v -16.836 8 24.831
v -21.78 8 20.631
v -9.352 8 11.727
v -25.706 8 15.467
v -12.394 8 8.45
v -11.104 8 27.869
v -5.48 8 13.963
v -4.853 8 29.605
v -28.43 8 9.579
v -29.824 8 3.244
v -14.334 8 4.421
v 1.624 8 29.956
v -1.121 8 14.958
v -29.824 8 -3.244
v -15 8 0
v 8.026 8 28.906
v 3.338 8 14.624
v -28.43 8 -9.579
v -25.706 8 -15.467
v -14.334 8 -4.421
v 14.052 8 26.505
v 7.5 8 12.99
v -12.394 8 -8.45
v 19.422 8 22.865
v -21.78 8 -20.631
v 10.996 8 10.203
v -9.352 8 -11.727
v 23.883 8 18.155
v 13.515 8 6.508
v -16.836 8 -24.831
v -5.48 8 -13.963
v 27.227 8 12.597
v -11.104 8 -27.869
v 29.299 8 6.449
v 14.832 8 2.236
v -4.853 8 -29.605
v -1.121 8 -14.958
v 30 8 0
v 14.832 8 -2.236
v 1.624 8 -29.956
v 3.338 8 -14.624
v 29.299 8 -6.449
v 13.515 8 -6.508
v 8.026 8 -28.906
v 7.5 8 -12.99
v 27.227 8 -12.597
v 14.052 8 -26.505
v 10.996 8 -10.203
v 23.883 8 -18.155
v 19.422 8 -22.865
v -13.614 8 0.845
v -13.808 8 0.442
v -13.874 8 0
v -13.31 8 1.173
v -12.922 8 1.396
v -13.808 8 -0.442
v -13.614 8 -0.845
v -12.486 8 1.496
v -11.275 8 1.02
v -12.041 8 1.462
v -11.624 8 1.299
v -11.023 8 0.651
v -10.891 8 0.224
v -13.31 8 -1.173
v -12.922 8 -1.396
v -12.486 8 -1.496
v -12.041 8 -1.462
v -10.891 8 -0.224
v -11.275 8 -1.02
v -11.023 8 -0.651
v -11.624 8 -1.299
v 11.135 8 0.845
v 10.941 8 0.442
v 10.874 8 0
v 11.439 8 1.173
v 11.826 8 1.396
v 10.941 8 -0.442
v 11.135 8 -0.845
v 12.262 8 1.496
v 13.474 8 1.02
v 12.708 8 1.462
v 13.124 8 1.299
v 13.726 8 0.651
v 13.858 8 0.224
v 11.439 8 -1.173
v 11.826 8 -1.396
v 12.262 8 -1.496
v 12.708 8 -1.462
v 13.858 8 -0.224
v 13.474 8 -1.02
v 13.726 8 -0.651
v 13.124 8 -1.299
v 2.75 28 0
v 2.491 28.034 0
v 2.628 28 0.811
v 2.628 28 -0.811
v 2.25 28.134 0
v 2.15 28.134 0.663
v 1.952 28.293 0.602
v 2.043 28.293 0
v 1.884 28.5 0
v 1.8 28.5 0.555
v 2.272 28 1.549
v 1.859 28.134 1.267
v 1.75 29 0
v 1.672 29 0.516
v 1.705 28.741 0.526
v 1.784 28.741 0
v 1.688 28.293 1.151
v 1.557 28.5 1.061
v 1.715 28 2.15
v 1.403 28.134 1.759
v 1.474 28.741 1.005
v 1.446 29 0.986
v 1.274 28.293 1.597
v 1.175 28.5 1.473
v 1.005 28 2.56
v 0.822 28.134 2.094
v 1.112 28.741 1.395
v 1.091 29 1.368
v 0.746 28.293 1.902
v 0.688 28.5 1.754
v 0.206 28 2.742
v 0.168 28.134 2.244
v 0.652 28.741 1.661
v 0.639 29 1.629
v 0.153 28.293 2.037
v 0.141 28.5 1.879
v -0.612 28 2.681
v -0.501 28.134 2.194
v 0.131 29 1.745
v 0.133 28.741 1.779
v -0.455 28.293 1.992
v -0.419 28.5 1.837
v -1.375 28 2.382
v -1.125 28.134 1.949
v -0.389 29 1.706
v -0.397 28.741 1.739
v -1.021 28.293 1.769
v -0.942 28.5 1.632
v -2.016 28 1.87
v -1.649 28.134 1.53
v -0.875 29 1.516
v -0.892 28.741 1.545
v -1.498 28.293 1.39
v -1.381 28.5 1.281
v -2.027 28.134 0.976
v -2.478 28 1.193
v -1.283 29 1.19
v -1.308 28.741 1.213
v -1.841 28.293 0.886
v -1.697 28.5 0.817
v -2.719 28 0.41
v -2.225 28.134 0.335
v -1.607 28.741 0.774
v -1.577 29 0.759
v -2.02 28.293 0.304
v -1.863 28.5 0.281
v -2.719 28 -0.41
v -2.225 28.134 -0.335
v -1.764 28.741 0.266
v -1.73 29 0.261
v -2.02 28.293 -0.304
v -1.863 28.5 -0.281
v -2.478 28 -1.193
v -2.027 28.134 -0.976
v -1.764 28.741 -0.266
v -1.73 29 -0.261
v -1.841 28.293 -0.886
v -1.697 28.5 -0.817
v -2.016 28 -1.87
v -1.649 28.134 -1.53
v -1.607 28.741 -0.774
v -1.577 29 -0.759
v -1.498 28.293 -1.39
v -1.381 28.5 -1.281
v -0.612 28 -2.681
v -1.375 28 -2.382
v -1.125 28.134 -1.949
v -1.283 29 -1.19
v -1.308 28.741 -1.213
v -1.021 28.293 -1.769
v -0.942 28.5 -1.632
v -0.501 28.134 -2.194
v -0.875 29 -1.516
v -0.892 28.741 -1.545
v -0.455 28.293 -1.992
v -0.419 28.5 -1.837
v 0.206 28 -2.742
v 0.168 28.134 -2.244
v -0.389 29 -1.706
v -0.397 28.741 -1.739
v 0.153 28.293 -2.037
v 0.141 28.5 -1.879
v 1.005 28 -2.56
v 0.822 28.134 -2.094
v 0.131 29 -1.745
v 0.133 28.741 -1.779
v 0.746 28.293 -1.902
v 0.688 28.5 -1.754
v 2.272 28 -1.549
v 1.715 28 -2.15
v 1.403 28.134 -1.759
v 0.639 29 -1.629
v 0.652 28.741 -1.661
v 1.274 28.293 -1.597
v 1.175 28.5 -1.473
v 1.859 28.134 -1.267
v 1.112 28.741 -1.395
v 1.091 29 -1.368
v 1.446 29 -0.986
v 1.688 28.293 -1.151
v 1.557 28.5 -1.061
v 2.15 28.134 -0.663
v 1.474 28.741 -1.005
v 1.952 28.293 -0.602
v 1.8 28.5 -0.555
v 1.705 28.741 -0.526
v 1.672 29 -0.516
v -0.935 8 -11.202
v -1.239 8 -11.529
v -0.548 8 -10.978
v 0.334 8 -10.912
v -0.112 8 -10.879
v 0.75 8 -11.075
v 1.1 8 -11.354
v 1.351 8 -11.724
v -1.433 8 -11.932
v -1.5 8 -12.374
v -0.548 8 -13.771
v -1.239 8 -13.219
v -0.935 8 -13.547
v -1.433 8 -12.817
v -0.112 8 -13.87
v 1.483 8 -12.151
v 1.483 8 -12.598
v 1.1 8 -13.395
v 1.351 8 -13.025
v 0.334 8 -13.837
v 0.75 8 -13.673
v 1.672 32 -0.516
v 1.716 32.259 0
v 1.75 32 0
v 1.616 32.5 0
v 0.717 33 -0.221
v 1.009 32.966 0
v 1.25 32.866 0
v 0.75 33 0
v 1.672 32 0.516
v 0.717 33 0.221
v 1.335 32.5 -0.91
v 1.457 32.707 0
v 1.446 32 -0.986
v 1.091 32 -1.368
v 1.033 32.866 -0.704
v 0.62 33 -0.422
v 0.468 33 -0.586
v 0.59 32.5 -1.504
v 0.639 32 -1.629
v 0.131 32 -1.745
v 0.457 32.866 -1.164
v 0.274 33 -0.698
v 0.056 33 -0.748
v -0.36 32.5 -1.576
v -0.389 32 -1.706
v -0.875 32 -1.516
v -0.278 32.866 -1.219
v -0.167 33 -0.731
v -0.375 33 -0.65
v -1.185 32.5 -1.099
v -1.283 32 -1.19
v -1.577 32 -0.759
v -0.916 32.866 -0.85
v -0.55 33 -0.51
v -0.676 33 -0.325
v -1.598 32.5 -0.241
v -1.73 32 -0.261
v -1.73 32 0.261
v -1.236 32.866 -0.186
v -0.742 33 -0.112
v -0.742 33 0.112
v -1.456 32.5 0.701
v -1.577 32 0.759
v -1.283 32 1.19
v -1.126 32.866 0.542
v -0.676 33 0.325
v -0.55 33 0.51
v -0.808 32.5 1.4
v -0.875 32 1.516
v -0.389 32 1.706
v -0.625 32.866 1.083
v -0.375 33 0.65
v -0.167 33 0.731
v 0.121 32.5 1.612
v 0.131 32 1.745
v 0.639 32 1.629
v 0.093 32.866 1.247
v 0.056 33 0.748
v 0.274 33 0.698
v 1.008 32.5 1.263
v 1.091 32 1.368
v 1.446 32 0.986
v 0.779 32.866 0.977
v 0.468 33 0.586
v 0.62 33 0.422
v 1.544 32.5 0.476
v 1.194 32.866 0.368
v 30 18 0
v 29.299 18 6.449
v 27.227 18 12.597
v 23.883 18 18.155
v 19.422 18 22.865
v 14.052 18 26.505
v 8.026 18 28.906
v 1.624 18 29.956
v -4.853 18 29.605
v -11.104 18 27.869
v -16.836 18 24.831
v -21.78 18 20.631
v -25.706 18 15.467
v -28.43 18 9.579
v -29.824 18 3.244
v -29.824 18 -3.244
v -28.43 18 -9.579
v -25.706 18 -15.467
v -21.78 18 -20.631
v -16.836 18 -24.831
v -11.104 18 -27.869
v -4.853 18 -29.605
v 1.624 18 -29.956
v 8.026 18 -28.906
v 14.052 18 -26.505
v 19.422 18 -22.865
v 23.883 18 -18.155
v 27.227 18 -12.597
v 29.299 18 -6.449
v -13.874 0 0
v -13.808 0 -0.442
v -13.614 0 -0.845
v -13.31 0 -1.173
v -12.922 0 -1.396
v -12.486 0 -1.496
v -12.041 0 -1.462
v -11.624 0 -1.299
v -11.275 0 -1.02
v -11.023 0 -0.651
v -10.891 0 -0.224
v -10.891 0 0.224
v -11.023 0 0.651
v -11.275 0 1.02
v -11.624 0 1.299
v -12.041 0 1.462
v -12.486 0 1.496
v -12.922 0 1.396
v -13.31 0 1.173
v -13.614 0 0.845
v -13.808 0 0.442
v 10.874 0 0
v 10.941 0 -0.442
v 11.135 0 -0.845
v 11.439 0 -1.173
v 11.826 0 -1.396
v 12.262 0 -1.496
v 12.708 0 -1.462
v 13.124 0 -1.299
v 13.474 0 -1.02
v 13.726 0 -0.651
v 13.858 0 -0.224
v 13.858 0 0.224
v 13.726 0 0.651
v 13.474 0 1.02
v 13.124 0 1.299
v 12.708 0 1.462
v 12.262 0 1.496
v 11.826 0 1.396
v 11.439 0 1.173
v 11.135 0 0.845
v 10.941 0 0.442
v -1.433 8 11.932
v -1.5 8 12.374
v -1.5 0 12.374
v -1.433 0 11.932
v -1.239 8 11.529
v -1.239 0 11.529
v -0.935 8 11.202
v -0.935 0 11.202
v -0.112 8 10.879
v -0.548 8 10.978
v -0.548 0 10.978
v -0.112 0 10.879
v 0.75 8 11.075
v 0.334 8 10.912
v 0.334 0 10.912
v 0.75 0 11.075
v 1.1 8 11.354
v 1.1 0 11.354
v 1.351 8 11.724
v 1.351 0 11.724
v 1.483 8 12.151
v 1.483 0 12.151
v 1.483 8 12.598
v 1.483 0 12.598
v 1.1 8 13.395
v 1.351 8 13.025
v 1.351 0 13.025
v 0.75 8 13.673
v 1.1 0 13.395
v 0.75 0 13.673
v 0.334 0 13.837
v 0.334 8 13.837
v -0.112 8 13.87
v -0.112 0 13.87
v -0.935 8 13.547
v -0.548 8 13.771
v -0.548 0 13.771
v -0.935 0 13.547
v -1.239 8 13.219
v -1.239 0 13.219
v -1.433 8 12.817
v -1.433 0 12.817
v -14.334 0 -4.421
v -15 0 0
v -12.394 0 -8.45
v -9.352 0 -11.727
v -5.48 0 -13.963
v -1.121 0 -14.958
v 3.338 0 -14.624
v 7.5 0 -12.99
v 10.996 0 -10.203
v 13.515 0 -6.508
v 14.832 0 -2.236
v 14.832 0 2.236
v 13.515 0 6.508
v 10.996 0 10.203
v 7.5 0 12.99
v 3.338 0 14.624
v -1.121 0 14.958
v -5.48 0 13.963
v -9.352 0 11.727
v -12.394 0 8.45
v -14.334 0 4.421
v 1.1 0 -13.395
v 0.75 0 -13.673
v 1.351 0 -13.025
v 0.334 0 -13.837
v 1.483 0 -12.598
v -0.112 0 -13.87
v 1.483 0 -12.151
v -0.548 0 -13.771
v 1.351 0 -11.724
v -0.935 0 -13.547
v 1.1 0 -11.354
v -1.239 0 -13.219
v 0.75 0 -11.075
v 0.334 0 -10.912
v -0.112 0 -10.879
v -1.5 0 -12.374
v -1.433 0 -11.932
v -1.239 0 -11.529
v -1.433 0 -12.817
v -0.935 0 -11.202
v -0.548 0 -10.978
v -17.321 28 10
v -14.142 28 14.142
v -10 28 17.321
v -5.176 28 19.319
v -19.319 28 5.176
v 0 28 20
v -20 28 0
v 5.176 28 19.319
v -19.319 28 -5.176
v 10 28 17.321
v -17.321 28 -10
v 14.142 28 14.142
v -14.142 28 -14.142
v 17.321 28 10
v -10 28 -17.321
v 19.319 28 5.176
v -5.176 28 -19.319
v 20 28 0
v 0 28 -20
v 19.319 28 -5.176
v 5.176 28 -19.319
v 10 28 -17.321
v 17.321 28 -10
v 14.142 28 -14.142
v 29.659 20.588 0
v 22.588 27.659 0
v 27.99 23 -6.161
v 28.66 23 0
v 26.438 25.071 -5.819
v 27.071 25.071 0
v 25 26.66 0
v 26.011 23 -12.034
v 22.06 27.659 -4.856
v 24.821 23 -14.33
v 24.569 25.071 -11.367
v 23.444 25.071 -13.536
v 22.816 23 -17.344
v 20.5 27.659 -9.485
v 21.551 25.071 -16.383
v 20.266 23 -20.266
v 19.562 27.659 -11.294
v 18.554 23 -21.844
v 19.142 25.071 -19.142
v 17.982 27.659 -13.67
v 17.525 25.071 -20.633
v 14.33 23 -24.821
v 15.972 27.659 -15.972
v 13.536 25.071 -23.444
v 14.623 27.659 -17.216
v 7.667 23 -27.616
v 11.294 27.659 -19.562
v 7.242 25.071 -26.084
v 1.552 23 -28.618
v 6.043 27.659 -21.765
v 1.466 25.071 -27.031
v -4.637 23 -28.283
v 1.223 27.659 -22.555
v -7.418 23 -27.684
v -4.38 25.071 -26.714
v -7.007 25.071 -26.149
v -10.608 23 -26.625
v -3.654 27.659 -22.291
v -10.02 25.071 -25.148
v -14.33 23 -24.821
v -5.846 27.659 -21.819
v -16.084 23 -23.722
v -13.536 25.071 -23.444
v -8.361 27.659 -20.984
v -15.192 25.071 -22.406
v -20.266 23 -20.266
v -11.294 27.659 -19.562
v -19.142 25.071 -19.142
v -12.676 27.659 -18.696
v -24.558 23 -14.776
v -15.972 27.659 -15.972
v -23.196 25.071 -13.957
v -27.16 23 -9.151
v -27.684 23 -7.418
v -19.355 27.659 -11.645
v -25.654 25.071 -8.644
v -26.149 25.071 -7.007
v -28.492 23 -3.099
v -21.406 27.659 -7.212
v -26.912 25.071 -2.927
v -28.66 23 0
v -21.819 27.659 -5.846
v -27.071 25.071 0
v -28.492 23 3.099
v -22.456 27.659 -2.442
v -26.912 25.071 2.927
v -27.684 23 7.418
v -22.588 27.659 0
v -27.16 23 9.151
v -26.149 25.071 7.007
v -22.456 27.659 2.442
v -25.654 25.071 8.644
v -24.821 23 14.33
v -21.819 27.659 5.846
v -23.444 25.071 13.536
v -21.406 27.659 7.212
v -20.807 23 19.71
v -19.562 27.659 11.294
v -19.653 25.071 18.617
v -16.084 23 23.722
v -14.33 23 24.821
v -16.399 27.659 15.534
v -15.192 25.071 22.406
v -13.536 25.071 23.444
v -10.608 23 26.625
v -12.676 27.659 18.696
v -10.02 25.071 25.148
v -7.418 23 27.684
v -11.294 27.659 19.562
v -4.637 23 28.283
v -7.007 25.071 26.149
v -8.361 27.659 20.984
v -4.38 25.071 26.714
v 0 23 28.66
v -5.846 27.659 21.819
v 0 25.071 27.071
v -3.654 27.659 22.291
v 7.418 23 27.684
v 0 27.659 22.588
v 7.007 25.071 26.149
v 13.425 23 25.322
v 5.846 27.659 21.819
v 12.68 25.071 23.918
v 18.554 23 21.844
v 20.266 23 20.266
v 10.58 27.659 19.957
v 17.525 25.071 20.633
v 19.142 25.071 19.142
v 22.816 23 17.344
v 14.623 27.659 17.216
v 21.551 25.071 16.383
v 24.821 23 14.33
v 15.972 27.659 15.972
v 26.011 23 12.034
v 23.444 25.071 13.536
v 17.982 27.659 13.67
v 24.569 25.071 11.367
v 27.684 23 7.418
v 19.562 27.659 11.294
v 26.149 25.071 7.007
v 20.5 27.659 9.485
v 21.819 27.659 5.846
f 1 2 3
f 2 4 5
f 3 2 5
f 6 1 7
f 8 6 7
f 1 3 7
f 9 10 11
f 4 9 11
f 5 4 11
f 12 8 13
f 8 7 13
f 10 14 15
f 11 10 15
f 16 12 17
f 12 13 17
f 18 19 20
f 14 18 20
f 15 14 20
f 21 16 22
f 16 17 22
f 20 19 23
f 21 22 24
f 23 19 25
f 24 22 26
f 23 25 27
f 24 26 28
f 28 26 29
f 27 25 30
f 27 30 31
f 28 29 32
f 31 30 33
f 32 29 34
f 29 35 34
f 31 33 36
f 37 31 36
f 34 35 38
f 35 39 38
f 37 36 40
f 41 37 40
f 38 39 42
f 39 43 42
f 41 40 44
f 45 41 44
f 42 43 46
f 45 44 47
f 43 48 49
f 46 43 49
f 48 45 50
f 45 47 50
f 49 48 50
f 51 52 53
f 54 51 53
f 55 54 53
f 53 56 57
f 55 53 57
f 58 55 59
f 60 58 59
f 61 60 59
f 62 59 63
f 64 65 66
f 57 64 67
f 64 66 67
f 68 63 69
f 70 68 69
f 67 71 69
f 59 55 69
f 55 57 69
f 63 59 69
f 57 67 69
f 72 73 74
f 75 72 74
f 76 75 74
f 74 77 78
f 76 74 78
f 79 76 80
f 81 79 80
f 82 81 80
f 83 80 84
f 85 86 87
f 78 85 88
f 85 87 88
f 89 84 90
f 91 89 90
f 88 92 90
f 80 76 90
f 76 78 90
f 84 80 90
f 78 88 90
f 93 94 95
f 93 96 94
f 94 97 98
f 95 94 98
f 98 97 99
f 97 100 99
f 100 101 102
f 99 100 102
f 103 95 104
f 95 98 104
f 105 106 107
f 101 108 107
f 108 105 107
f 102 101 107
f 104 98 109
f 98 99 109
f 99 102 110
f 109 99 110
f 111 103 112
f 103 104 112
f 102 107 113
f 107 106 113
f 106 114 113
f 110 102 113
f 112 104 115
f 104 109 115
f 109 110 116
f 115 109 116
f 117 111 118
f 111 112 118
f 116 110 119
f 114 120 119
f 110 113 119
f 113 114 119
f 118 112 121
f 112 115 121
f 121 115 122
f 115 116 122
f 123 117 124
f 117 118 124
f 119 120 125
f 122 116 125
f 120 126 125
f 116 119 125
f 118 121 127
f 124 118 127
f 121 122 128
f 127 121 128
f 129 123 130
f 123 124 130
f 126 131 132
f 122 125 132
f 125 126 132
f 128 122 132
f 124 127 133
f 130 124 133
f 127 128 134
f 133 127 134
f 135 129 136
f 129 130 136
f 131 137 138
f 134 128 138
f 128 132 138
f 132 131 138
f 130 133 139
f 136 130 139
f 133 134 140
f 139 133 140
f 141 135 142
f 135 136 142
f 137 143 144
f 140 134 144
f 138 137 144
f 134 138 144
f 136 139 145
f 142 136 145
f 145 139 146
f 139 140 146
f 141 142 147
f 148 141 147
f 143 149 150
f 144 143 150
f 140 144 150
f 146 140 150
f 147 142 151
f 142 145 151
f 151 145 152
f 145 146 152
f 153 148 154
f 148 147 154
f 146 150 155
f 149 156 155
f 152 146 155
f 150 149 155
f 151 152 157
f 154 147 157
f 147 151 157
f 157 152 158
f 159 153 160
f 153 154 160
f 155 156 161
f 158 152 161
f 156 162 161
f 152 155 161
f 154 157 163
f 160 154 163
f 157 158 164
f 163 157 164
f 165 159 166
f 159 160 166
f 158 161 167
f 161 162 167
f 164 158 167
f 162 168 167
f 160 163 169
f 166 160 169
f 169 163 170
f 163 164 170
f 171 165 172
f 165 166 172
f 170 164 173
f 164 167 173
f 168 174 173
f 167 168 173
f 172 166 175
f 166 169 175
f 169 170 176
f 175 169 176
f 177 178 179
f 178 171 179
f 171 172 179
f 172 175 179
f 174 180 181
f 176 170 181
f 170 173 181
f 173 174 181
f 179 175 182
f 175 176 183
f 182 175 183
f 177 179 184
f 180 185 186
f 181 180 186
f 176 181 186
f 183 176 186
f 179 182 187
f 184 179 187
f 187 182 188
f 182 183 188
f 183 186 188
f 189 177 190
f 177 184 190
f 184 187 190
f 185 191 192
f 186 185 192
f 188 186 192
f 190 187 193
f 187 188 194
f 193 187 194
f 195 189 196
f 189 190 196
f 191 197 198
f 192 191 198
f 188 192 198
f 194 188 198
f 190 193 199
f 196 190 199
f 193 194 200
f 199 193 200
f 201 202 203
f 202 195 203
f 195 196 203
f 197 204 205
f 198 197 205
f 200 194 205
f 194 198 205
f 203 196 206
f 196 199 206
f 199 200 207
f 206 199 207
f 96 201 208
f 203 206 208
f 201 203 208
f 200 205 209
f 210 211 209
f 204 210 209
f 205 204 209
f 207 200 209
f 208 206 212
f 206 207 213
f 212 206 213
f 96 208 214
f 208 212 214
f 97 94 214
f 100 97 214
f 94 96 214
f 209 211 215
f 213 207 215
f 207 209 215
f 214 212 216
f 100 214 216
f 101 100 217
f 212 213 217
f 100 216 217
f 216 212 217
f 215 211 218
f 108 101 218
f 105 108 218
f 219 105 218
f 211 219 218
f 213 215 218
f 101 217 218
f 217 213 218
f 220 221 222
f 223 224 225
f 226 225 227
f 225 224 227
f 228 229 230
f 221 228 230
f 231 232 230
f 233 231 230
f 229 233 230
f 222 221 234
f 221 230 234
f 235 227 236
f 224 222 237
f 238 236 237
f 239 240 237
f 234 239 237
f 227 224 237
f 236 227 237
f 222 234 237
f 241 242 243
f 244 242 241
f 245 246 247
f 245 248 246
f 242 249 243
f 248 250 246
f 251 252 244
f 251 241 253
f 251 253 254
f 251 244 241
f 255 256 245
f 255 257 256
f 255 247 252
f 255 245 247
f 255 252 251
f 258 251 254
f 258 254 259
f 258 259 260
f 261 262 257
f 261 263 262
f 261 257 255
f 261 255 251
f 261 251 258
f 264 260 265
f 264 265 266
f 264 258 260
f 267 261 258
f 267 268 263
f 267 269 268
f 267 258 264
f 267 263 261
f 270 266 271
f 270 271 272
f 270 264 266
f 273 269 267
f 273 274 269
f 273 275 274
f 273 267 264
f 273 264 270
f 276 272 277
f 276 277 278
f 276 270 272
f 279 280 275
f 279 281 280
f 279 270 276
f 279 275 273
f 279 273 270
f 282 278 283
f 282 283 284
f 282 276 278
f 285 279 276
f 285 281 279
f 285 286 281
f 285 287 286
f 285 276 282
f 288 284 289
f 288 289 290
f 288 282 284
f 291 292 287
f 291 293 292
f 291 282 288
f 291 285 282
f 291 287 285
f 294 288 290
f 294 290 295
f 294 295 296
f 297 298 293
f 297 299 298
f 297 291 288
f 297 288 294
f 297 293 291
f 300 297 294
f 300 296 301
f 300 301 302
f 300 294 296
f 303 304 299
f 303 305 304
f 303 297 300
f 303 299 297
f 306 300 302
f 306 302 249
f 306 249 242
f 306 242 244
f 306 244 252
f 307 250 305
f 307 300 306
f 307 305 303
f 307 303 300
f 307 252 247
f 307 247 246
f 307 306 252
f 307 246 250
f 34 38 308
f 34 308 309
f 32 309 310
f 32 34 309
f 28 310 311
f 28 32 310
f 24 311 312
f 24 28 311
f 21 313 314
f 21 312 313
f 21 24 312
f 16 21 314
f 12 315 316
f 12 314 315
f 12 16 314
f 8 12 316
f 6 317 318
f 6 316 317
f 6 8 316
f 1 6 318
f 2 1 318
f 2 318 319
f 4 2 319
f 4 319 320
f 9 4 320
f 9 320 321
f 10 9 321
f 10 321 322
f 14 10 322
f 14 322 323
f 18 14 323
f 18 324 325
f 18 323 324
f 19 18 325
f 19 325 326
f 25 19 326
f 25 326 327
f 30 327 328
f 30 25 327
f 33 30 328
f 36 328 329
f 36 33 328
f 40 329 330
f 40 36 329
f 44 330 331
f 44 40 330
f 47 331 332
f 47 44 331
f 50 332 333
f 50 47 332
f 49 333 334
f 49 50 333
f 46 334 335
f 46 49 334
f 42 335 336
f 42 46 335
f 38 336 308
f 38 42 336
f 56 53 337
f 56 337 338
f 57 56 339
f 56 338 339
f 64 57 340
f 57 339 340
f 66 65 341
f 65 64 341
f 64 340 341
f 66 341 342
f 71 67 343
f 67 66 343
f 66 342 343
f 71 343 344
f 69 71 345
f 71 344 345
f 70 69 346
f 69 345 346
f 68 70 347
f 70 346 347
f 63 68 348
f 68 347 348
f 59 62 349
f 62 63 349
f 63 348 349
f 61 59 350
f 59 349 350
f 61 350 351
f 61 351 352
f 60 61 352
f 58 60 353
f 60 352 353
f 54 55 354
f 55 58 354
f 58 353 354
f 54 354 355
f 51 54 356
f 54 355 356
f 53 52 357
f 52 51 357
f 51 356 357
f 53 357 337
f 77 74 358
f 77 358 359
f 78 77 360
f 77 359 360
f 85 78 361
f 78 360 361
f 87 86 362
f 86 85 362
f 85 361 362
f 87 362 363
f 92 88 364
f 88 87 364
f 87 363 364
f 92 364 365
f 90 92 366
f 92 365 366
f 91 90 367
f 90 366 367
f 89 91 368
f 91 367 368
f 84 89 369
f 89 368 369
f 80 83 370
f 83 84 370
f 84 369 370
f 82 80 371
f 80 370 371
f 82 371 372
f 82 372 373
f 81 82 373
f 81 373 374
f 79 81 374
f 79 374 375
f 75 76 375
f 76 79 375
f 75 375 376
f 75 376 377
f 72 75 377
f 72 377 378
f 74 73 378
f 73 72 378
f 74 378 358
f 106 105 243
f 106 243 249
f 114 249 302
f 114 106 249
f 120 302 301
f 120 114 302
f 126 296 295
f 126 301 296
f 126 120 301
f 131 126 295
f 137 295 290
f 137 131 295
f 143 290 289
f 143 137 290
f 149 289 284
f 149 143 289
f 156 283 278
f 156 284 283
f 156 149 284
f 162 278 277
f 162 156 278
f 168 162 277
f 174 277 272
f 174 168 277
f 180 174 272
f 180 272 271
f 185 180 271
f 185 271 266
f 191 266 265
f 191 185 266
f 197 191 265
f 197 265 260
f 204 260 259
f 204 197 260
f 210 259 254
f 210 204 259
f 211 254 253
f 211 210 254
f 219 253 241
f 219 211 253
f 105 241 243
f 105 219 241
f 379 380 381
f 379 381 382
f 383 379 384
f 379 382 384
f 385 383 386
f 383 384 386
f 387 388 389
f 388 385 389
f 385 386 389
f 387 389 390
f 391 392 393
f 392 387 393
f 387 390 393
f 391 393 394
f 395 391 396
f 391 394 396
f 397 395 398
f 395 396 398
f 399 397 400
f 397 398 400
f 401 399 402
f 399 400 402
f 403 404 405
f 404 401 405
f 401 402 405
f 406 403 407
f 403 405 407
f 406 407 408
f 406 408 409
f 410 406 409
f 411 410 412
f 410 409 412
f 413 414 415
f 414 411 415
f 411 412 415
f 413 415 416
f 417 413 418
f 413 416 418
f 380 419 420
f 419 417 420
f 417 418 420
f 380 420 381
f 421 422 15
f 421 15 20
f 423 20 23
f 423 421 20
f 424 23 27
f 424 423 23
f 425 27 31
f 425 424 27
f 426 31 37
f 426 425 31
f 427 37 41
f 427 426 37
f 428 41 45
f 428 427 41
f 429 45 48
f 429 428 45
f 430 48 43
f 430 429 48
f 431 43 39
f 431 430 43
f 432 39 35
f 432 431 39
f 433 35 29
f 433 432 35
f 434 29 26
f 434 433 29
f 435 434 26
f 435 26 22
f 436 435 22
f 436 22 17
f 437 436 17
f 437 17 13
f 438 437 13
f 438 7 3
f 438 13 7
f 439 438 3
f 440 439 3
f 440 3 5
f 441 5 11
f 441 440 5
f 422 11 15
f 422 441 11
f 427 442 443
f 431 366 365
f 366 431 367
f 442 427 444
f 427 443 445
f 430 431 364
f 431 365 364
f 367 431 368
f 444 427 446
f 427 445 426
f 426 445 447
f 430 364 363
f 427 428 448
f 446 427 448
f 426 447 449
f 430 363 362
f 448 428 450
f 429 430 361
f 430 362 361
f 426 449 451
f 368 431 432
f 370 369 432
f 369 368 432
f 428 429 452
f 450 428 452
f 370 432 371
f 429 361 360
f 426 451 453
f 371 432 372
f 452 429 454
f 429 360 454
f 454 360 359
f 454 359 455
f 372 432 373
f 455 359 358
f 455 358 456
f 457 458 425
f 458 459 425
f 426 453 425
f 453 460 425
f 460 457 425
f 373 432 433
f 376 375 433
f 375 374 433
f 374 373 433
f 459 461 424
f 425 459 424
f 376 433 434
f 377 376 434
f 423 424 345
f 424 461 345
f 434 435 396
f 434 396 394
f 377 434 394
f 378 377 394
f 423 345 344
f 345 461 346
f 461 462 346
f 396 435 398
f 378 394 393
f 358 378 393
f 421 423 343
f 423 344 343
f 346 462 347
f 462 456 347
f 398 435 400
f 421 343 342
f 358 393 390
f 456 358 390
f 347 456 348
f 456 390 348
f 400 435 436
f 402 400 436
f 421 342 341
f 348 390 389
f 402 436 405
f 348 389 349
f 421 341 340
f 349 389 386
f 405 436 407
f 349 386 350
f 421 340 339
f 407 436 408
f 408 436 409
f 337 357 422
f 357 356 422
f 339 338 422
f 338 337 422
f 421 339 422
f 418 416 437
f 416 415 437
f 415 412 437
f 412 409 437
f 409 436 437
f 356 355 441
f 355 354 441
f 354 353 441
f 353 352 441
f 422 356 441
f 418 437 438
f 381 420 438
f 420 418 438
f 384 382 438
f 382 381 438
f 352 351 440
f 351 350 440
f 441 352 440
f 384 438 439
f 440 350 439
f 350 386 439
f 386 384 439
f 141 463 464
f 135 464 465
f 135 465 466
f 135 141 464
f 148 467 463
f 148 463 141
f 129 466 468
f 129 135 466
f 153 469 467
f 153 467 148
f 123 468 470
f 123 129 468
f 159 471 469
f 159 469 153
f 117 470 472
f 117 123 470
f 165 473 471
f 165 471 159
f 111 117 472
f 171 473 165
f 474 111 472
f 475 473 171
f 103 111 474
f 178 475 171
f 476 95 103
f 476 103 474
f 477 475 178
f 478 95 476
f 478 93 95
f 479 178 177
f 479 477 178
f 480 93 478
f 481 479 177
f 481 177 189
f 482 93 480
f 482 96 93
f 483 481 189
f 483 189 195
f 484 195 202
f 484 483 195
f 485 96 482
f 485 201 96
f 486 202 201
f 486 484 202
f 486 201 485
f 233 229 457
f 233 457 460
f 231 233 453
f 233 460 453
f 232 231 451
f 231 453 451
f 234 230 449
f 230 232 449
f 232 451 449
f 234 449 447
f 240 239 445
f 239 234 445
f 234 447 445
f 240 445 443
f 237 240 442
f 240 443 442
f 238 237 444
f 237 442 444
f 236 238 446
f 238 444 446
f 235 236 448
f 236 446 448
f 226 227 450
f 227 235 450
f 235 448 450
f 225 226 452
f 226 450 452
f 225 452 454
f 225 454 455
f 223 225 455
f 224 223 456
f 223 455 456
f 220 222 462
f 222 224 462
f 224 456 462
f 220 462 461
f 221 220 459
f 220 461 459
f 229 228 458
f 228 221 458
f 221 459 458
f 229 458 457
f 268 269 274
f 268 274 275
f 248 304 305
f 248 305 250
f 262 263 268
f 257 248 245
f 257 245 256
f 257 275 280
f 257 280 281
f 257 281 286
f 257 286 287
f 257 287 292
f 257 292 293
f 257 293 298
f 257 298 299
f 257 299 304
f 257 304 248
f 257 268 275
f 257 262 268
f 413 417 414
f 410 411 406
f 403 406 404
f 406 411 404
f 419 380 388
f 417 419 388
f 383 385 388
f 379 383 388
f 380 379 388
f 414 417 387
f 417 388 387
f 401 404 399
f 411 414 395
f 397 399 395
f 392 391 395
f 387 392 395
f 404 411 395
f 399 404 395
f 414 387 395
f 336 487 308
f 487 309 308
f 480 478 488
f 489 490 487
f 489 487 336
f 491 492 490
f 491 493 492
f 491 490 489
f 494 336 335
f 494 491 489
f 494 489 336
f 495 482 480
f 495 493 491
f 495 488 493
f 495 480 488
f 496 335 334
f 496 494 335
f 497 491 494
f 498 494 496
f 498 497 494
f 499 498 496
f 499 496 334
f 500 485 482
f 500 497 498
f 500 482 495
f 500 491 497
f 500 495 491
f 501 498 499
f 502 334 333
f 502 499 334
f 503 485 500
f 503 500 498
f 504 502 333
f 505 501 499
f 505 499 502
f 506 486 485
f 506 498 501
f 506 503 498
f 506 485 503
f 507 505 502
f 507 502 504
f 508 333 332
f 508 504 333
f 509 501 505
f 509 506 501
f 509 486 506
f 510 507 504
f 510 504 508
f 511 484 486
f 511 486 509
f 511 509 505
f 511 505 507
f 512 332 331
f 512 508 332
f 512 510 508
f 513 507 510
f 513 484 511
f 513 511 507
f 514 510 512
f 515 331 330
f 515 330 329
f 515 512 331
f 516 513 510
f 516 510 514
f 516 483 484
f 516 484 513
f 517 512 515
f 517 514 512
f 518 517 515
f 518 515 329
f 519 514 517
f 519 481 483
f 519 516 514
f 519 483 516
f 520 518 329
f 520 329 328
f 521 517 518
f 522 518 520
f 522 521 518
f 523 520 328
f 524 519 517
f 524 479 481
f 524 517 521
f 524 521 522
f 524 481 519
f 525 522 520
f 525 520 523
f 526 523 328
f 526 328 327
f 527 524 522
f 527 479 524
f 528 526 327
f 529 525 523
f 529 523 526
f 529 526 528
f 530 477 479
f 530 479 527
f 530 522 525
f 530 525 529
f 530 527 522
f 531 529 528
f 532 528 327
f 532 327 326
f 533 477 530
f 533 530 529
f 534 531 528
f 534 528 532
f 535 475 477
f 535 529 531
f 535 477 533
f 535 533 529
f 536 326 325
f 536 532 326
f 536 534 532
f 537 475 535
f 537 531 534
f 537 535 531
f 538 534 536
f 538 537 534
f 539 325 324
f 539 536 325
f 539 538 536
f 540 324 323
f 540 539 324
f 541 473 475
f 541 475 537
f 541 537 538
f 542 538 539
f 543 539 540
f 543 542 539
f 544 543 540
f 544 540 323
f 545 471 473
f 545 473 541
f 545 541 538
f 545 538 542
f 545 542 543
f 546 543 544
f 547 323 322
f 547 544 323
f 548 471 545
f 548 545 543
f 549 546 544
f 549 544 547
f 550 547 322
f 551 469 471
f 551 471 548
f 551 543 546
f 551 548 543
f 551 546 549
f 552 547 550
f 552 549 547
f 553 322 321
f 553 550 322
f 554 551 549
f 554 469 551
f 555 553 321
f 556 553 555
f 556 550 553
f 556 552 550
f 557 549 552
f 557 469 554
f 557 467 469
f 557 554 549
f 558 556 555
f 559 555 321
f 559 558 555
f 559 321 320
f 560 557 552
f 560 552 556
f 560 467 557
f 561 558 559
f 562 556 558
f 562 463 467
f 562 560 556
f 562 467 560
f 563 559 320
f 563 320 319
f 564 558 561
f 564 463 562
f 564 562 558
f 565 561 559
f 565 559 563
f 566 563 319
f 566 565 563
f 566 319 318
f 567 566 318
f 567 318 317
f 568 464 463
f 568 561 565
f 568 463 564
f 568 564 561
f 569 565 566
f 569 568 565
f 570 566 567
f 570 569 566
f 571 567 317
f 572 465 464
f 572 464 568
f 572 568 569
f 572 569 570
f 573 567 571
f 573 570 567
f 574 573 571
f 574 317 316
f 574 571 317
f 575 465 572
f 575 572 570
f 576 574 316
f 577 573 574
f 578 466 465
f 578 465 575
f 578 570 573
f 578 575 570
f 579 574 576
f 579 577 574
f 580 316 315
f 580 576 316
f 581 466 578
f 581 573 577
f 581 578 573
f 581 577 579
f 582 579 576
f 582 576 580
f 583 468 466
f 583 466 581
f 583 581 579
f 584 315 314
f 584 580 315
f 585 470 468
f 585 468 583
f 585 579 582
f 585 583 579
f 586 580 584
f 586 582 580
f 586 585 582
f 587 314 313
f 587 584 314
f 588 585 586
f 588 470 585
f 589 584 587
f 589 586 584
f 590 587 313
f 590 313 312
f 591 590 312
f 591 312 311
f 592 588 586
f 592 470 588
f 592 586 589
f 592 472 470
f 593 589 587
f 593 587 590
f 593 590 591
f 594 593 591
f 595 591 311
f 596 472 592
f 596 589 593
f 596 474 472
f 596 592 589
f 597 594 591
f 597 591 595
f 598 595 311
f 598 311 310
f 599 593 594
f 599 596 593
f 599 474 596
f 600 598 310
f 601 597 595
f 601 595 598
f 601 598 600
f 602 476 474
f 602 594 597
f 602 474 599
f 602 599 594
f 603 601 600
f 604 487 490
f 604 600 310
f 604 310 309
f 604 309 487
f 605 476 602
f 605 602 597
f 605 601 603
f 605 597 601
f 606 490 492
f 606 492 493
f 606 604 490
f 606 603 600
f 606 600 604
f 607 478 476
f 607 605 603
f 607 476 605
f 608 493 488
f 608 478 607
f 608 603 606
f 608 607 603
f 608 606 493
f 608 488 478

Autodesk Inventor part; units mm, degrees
ref_plane "YZ Plane" through (0, 0, 0) normal (1, 0, 0) x (0, 1, 0)
ref_plane "XZ Plane" through (0, 0, 0) normal (0, 1, 0) x (-1, 0, 0)
ref_plane "XY Plane" through (0, 0, 0) normal (0, 0, 1) x (1, 0, 0)
sketch "Sketch1" plane through (0, 0, 0) normal (0, 1, 0) x (-1, 0, 0)
  circle A0 centre (0, 0) radius 15
  circle A1 centre (12.3744, 0) radius 1.5
  circle A2 centre (0, 12.3744) radius 1.5
  circle A3 centre (-12.3744, 0) radius 1.5
  circle A4 centre (0, -12.3744) radius 1.5
  dimension "d0" = 30
  dimension "d1" = 3
  dimension "d5" = 360
  dimension "d17" = 14.5
extrude "Extrusion1" add sketch "Sketch1" along normal blind 8
sketch "Sketch2" plane through (0, 8, 0) normal (0, 1, 0) x (1, 0, 0)
  circle A0 centre (0, 0) radius 30
  dimension "d9" = 60
extrude "Extrusion2" add sketch "Sketch2" along normal blind 20
fillet "Fillet1" radius 10 1 edges at (-30, 28, 0)
sketch "Sketch3" plane through (0, 28, 0) normal (0, 1, 0) x (1, 0, 0)
  circle A0 centre (0, 0) radius 1.75
  dimension "d13" = 3.5
extrude "Extrusion3" add sketch "Sketch3" along normal blind 5
fillet "Fillet2" radius 1 2 edges at (-1.75, 28, 0) (-1.75, 33, 0)
equation "\"d0\" = BottomDiameter"
equation "\"d1\" = MountingHoleDiameter"
equation "\"d7\" = BottomHeight"
equation "\"d9\" = TopDiameter"
equation "\"d10\" = TopHeight"
equation "\"d14\" = NubHeight"
equation "\"BottomDiameter\" = 30"
equation "\"MountingHoleDiameter\" = 3"
equation "\"TopDiameter\" = 60"
equation "\"BottomHeight\" = 8"
equation "\"TopHeight\" = 20"
equation "\"NubHeight\" = 5"
properties part number "Motor"
